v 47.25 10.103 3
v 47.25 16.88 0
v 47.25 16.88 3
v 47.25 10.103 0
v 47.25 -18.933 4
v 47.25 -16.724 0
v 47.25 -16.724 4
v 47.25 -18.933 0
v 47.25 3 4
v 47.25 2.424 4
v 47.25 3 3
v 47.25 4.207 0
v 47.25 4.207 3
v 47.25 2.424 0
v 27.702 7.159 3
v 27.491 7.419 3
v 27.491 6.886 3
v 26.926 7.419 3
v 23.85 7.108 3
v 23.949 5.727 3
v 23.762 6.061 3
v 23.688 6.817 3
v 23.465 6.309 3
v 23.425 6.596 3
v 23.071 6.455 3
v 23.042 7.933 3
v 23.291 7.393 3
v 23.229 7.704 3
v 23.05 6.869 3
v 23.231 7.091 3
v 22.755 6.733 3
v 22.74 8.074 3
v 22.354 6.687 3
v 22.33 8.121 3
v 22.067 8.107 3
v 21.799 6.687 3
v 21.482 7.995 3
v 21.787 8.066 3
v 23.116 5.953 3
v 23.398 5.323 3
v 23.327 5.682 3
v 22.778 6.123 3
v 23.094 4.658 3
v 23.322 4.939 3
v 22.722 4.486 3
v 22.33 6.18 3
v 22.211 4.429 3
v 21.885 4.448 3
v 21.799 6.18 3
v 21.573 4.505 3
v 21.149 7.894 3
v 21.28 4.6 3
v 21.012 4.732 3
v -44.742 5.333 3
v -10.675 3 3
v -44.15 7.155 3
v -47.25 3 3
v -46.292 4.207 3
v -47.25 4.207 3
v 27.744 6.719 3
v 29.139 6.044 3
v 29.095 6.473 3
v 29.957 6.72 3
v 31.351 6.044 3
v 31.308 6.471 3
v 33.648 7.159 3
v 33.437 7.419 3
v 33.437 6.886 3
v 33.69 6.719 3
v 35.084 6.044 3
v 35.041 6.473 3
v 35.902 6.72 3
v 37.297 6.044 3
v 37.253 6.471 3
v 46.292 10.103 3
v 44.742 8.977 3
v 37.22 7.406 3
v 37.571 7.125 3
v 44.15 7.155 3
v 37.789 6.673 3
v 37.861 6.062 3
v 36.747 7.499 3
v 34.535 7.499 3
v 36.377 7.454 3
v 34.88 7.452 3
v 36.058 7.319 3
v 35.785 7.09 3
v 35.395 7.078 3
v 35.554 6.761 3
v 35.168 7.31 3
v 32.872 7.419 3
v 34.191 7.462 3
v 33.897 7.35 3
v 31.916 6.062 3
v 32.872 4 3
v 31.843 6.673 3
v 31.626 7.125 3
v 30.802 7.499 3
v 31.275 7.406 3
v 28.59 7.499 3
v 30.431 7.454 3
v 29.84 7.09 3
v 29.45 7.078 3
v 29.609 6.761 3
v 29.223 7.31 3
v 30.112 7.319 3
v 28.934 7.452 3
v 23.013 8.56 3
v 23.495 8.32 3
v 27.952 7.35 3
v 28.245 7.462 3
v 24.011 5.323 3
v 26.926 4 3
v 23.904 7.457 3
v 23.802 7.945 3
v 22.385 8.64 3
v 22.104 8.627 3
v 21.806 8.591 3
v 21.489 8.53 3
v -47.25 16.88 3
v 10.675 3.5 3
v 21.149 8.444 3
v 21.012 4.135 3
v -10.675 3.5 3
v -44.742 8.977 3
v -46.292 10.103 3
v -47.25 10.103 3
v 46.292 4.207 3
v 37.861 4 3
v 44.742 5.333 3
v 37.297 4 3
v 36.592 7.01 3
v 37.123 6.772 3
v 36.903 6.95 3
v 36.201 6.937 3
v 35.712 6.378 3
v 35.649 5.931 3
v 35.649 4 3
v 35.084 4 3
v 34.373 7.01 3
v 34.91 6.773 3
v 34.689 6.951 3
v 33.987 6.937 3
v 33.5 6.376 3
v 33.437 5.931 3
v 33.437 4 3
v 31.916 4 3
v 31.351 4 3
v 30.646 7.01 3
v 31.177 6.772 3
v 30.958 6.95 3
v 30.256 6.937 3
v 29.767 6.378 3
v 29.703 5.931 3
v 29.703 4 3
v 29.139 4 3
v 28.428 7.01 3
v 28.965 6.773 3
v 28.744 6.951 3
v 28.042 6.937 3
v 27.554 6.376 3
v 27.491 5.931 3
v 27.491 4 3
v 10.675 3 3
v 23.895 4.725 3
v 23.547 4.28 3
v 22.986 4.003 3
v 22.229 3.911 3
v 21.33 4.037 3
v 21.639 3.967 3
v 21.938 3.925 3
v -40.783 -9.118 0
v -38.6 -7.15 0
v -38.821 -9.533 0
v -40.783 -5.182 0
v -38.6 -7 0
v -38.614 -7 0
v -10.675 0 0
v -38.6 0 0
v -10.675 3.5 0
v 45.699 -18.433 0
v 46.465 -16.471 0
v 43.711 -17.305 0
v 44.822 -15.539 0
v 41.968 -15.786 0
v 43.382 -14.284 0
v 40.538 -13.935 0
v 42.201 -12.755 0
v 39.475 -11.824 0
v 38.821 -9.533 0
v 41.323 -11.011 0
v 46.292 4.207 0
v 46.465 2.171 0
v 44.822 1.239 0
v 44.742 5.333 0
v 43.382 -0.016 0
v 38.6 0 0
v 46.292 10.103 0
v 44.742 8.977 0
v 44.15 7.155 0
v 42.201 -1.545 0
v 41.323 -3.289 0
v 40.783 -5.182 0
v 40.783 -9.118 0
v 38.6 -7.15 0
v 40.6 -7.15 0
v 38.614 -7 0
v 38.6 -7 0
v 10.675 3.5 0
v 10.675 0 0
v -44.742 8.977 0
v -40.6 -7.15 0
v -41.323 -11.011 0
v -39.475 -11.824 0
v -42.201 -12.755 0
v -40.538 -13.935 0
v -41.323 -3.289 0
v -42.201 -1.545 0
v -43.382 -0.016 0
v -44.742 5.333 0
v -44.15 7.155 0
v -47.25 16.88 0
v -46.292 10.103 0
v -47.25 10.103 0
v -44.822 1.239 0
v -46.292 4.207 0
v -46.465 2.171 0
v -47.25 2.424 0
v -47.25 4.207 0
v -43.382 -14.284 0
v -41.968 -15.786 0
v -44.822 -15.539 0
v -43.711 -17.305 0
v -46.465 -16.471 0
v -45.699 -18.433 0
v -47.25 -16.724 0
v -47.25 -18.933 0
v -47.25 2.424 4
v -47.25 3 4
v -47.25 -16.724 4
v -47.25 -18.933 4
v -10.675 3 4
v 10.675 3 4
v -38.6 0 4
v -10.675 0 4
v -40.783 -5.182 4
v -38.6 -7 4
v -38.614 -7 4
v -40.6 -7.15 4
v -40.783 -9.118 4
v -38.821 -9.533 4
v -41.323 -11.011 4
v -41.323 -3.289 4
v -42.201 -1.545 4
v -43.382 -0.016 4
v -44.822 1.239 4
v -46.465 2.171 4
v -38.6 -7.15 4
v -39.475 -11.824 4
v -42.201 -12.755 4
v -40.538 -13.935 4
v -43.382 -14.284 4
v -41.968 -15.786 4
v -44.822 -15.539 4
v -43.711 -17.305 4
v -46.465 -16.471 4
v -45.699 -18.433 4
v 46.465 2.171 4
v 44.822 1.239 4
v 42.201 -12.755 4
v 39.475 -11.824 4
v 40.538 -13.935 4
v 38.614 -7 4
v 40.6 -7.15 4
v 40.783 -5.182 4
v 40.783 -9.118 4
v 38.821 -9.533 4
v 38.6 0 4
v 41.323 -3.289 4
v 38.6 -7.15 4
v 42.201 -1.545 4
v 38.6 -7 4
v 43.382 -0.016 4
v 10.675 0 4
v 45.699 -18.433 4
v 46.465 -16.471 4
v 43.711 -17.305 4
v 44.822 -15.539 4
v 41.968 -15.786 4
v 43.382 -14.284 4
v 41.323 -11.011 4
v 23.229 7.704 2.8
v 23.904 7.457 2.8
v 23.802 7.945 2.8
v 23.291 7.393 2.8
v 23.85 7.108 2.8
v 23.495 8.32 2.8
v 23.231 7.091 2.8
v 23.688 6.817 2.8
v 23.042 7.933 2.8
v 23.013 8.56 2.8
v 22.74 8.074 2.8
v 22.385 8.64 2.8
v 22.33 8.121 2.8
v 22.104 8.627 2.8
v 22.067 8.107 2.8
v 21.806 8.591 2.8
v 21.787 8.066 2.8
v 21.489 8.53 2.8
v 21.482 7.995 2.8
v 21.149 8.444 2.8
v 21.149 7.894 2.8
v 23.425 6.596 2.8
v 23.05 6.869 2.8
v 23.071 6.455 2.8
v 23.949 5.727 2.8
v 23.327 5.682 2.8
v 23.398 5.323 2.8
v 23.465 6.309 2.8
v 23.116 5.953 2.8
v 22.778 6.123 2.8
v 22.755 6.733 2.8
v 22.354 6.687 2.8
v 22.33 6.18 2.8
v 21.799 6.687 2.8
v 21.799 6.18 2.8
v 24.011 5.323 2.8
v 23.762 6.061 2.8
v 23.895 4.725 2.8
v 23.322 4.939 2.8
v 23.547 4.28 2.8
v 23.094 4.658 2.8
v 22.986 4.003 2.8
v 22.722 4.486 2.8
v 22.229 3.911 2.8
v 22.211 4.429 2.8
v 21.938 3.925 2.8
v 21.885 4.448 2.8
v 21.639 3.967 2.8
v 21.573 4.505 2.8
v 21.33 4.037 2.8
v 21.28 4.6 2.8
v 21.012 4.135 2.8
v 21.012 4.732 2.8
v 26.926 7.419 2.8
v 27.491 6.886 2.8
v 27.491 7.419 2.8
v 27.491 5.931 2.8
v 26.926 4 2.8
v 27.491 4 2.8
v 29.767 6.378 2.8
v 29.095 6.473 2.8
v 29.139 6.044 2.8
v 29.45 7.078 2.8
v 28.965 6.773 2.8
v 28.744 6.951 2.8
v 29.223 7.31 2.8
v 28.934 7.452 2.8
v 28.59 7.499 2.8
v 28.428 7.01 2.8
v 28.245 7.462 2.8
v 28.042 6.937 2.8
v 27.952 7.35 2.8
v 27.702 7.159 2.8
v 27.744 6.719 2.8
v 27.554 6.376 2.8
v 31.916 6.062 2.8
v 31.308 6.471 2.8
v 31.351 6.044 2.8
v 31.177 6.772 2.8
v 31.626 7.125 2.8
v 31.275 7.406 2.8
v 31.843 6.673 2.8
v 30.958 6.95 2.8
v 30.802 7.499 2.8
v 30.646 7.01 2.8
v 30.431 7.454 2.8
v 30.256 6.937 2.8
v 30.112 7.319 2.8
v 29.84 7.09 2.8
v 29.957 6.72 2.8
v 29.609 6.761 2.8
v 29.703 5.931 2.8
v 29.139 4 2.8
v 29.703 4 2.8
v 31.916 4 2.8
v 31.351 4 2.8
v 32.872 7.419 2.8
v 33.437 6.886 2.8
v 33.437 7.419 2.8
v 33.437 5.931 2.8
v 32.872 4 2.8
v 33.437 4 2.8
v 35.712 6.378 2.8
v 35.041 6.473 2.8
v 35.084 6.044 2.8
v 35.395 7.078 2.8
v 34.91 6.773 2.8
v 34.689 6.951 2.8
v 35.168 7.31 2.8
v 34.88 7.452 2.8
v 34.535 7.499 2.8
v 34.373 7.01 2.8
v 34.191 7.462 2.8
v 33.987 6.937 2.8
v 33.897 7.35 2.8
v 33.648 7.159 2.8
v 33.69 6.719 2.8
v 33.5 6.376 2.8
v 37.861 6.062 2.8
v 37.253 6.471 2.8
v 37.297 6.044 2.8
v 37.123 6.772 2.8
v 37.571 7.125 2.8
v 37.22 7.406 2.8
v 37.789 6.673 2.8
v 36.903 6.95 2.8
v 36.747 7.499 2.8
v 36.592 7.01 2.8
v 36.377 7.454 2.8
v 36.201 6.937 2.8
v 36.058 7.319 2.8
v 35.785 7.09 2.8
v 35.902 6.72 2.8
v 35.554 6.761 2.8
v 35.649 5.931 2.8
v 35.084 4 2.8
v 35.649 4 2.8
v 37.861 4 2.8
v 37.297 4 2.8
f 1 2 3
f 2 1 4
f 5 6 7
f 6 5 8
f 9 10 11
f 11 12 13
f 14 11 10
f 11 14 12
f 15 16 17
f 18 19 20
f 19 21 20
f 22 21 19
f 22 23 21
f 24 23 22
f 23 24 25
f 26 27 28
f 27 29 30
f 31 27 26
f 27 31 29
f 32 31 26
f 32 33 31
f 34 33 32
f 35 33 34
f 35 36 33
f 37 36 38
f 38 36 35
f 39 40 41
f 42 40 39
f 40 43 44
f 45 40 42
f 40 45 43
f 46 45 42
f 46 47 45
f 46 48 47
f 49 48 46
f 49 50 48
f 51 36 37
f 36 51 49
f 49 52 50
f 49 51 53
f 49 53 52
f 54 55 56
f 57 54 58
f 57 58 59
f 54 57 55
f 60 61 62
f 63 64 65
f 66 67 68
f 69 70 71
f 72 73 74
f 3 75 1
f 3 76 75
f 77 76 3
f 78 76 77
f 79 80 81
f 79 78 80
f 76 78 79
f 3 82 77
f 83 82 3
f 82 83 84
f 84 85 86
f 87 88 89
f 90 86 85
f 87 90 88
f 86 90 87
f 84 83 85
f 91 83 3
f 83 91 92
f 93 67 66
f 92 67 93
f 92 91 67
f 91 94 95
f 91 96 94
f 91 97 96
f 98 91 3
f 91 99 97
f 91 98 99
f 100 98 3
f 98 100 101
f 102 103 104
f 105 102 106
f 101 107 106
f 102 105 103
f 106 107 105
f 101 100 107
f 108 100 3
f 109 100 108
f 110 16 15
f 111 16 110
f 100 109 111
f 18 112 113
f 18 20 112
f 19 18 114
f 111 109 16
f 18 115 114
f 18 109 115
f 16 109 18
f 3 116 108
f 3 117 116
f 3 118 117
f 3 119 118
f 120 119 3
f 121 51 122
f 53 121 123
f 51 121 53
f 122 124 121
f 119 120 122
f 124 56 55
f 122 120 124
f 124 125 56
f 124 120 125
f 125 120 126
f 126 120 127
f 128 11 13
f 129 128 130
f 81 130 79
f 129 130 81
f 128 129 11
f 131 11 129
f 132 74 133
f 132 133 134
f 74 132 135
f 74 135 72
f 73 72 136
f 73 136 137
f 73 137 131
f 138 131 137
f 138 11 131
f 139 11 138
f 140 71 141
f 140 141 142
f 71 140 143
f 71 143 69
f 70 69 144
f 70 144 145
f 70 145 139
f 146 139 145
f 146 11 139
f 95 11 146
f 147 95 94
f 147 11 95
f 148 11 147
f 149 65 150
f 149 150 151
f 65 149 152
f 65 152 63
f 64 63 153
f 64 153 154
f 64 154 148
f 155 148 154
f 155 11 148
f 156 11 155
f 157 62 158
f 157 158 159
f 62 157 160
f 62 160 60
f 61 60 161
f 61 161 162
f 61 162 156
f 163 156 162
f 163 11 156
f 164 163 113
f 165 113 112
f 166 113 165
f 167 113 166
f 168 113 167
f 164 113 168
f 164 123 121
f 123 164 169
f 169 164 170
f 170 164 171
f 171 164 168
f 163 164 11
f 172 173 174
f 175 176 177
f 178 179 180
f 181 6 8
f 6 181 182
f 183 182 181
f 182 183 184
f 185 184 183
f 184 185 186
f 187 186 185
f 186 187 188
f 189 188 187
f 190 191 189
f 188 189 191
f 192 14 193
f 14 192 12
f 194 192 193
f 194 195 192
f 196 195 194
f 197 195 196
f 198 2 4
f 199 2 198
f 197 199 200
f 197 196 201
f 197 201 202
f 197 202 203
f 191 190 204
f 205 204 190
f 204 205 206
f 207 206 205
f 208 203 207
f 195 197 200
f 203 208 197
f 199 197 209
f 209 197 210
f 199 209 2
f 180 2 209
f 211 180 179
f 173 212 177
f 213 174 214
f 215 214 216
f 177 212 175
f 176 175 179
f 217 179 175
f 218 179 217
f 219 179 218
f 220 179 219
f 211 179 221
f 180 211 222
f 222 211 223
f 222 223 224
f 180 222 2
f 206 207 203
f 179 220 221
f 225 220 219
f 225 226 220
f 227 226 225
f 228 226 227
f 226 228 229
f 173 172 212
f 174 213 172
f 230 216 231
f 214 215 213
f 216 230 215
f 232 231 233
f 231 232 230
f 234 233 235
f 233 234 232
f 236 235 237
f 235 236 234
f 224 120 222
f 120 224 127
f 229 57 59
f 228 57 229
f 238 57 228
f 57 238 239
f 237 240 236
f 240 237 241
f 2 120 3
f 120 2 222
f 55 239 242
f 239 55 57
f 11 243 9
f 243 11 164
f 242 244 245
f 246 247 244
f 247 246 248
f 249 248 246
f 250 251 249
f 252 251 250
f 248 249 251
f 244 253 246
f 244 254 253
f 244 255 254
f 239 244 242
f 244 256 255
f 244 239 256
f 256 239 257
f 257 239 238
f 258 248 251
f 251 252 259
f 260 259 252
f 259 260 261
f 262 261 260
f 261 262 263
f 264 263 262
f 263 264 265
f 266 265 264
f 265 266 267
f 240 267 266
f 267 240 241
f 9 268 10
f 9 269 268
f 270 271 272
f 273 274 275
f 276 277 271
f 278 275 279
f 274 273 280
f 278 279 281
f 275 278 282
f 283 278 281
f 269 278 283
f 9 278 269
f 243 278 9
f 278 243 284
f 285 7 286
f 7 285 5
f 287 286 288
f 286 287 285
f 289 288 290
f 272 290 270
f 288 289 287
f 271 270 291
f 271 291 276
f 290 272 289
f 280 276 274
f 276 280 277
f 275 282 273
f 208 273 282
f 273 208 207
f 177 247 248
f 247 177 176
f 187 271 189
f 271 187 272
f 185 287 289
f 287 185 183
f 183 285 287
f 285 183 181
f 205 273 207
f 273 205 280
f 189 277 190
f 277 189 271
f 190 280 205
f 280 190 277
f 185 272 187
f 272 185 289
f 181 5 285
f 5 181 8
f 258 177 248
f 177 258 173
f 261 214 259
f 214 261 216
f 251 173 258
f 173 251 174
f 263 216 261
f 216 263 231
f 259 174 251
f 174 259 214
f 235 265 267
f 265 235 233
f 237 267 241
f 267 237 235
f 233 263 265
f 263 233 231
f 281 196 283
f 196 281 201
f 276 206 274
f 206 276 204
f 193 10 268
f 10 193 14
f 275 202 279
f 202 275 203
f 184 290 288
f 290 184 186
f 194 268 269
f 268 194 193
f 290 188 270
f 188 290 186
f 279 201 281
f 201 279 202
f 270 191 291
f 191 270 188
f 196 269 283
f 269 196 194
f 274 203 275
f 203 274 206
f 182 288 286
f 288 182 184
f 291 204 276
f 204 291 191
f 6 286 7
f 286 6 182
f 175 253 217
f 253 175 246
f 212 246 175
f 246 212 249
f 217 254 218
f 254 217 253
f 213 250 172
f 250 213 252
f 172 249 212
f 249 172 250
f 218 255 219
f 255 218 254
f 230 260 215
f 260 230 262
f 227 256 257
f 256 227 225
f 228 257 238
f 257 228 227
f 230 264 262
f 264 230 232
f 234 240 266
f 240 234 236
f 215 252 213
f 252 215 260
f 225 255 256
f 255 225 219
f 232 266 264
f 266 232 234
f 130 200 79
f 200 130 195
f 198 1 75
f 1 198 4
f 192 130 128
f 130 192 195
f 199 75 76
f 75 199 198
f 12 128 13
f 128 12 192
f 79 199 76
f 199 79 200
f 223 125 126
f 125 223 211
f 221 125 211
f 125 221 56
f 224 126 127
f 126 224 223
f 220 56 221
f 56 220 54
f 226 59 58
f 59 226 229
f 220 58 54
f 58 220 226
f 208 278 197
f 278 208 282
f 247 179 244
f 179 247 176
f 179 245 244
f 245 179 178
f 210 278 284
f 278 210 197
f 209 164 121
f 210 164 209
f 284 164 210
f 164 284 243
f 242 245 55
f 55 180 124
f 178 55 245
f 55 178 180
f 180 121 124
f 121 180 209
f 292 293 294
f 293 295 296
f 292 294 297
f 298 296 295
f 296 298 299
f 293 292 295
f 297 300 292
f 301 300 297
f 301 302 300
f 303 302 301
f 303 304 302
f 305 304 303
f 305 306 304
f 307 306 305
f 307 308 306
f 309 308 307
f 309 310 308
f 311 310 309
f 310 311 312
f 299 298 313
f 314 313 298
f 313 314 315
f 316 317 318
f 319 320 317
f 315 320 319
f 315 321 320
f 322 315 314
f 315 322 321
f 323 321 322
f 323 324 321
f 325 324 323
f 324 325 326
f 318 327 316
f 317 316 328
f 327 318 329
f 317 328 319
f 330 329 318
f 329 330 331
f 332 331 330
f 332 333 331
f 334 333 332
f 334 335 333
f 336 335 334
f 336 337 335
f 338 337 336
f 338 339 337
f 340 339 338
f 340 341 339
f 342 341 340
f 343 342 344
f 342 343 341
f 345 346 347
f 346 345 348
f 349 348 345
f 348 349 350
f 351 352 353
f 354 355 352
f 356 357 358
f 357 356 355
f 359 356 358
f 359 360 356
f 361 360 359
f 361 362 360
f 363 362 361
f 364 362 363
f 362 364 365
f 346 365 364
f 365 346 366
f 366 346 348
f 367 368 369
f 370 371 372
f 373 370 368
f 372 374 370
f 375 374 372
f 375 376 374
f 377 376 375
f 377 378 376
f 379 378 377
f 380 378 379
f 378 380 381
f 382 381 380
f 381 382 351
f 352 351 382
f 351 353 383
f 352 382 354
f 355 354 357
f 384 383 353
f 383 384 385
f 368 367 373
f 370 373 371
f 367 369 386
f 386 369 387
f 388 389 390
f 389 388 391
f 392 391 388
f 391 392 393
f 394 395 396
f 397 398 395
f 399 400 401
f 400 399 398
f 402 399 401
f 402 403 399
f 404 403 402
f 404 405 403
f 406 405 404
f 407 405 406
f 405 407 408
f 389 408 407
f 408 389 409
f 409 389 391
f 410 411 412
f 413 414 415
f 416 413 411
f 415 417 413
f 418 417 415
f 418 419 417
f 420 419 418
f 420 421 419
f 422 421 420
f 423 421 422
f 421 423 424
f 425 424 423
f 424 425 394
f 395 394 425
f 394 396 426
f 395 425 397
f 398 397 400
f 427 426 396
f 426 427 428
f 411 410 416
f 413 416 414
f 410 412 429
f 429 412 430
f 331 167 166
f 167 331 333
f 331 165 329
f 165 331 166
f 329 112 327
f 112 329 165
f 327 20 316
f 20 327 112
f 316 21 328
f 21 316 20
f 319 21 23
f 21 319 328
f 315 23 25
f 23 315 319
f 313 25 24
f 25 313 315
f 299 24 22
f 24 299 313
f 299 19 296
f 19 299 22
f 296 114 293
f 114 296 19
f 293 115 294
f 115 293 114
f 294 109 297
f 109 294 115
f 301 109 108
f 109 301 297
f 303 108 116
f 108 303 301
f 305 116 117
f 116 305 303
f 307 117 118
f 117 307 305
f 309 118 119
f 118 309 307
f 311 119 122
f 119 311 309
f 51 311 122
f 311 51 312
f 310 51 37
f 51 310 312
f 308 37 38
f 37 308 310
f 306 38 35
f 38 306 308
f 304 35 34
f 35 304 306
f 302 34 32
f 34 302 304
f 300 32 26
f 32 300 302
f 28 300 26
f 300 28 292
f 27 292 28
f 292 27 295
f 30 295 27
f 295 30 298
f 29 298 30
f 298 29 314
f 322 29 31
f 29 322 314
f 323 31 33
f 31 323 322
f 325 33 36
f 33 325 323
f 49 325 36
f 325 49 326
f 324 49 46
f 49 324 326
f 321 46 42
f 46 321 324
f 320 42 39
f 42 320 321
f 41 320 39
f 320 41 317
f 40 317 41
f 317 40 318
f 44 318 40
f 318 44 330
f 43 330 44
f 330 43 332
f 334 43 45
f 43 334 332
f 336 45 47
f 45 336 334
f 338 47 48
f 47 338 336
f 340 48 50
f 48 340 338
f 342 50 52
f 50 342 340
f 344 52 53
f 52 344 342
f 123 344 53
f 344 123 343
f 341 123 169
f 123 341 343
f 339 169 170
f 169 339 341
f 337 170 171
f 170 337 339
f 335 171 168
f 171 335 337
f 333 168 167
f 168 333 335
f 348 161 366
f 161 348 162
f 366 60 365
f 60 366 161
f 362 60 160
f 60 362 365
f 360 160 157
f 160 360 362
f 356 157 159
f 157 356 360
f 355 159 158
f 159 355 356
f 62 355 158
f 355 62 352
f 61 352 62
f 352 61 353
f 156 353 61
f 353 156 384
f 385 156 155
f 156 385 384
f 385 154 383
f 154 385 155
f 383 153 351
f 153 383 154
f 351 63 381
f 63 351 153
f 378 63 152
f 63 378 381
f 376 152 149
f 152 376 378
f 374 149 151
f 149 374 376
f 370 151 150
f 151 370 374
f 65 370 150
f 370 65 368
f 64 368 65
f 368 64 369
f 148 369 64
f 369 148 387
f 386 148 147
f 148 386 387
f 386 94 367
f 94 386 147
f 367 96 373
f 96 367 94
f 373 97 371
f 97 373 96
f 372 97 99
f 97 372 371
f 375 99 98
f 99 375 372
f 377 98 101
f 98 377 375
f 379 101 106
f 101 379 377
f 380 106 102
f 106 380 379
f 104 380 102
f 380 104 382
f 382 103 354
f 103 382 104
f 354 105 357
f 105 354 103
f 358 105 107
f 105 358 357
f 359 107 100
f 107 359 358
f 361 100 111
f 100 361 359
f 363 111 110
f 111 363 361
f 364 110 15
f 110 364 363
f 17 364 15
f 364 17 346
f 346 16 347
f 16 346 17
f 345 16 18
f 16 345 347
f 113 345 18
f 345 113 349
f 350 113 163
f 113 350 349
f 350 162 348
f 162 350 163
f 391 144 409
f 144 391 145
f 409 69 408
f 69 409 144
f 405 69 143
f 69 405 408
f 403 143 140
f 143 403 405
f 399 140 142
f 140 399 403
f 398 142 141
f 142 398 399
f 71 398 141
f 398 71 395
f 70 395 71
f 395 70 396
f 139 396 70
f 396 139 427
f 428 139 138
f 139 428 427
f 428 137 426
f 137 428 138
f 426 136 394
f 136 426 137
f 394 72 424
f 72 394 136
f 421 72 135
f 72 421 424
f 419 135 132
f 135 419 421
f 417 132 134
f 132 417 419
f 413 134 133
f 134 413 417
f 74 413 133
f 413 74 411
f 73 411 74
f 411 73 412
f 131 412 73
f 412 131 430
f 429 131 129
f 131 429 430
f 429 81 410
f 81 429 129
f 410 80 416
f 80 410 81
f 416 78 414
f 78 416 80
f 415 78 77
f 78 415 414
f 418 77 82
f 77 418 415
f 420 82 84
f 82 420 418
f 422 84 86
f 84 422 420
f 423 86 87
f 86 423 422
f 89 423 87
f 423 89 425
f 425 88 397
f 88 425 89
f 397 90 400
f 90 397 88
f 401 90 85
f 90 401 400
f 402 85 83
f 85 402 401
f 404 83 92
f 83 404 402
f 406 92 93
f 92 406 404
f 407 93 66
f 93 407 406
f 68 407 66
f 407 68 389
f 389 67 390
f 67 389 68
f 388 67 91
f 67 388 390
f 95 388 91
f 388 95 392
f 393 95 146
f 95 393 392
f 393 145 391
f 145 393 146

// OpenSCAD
// Customizable Z-axis shim for FlashForge Creator Pro 2016 by DrLex
// Based on Thing 1475239 by ben8p and Thing 557994 by Atomist
// Released under Creative Commons - Attribution - Share Alike license
// v2, 2017/07/30

// The distance you want the Z homing to be lowered.
ShimHeight = 3; // [1:0.1:10]
// How thick the clamping part should be.
ClampHeight = 4; // [2:0.1:10]
// Print the thickness on the model?
Label = "yes"; // [yes, no]
// Useful for very thin thims where Shimheight is smaller than ClampHeight.
Reinforce = "no"; // [yes, no]

/* [Hidden] */
RodDistance = 100; // [80:0.1:120]
RodDiameter = 19; // [15:0.1:25]

RodRadius = RodDiameter/2;
RodCenter = RodDistance/2 + 0.1;
MaxX = RodCenter - 2.85;
ClampScale = [1, 1.062, 1];

difference() {
    union() {
        difference() {
            union() {
                translate([-MaxX, 3, 0]) cube([2*MaxX, 13.88, ShimHeight]);
                translate([0, -2.0, ClampHeight/2]) cube([RodDistance, 10, ClampHeight], center=true);
                translate([RodCenter, -7.15, ClampHeight/2]) scale(ClampScale) cylinder(r=RodRadius + 2, h=ClampHeight, center=true, $fn=32);
                translate([-RodCenter, -7.15, ClampHeight/2]) scale(ClampScale) cylinder(r=RodRadius + 2, h=ClampHeight, center=true, $fn=32);
            }
            
            // Rod holes
            translate([RodCenter, -7.15, 9]) scale(ClampScale) cylinder(r=RodRadius, h=20, center=true, $fn=32);
            translate([-RodCenter, -7.15, 9]) scale(ClampScale) cylinder(r=RodRadius, h=20, center=true, $fn=32);
            
            // Side screw holes
            translate([MaxX, 7.155, 9]) cylinder(r=3.1, h=20, center=true);
            translate([-MaxX, 7.155, 9]) cylinder(r=3.1, h=20, center=true);

            
            // Chop off the sides
            translate([MaxX, -2*RodDiameter, -5]) cube([RodDiameter, 4 * RodDiameter, 20]);
            translate([-MaxX - RodDiameter, -2*RodDiameter, -5]) cube([RodDiameter, 4 * RodDiameter, 20]);
            // Chop off the center
            translate([0, -10, 9]) cube([2*(RodCenter - RodRadius - 2), 20, 20], center=true);
            
            if(ClampHeight > ShimHeight) {
                // Remove pieces of the clamps sticking out
                translate([-MaxX - 1, 3, ShimHeight]) cube([2*MaxX + 2, 13.88, 20]);
            }
        }

        if(Reinforce == "yes") {
            translate([0, 1.85, ClampHeight/2]) isoTrapezoidX(22, 30, 3.7, ClampHeight);
        }
    }
    
    // Space for leadscrew bearing
    if(Reinforce == "yes") {
        translate([0, 0, ClampHeight/2]) isoTrapezoidX(18, 28, 5, ClampHeight+0.1);
    }
    else {
        translate([0, 0, 9]) cube([21.35, 7, 20], center=true);
    }
        
    if(Label == "yes") {
        translate([MaxX-9, 4, ShimHeight - 0.2]) linear_extrude(1)  text(str(ShimHeight, " mm"), 4.5, font="Roboto", halign="right", $fn=14);
    }
}

module isoTrapezoidX(sizeXTop, sizeXBtm, sizeY, sizeZ) {
    linear_extrude(height=sizeZ, center=true) polygon([[-sizeXTop/2, sizeY/2], [sizeXTop/2, sizeY/2], [sizeXBtm/2, -sizeY/2], [-sizeXBtm/2, -sizeY/2]]);

}
